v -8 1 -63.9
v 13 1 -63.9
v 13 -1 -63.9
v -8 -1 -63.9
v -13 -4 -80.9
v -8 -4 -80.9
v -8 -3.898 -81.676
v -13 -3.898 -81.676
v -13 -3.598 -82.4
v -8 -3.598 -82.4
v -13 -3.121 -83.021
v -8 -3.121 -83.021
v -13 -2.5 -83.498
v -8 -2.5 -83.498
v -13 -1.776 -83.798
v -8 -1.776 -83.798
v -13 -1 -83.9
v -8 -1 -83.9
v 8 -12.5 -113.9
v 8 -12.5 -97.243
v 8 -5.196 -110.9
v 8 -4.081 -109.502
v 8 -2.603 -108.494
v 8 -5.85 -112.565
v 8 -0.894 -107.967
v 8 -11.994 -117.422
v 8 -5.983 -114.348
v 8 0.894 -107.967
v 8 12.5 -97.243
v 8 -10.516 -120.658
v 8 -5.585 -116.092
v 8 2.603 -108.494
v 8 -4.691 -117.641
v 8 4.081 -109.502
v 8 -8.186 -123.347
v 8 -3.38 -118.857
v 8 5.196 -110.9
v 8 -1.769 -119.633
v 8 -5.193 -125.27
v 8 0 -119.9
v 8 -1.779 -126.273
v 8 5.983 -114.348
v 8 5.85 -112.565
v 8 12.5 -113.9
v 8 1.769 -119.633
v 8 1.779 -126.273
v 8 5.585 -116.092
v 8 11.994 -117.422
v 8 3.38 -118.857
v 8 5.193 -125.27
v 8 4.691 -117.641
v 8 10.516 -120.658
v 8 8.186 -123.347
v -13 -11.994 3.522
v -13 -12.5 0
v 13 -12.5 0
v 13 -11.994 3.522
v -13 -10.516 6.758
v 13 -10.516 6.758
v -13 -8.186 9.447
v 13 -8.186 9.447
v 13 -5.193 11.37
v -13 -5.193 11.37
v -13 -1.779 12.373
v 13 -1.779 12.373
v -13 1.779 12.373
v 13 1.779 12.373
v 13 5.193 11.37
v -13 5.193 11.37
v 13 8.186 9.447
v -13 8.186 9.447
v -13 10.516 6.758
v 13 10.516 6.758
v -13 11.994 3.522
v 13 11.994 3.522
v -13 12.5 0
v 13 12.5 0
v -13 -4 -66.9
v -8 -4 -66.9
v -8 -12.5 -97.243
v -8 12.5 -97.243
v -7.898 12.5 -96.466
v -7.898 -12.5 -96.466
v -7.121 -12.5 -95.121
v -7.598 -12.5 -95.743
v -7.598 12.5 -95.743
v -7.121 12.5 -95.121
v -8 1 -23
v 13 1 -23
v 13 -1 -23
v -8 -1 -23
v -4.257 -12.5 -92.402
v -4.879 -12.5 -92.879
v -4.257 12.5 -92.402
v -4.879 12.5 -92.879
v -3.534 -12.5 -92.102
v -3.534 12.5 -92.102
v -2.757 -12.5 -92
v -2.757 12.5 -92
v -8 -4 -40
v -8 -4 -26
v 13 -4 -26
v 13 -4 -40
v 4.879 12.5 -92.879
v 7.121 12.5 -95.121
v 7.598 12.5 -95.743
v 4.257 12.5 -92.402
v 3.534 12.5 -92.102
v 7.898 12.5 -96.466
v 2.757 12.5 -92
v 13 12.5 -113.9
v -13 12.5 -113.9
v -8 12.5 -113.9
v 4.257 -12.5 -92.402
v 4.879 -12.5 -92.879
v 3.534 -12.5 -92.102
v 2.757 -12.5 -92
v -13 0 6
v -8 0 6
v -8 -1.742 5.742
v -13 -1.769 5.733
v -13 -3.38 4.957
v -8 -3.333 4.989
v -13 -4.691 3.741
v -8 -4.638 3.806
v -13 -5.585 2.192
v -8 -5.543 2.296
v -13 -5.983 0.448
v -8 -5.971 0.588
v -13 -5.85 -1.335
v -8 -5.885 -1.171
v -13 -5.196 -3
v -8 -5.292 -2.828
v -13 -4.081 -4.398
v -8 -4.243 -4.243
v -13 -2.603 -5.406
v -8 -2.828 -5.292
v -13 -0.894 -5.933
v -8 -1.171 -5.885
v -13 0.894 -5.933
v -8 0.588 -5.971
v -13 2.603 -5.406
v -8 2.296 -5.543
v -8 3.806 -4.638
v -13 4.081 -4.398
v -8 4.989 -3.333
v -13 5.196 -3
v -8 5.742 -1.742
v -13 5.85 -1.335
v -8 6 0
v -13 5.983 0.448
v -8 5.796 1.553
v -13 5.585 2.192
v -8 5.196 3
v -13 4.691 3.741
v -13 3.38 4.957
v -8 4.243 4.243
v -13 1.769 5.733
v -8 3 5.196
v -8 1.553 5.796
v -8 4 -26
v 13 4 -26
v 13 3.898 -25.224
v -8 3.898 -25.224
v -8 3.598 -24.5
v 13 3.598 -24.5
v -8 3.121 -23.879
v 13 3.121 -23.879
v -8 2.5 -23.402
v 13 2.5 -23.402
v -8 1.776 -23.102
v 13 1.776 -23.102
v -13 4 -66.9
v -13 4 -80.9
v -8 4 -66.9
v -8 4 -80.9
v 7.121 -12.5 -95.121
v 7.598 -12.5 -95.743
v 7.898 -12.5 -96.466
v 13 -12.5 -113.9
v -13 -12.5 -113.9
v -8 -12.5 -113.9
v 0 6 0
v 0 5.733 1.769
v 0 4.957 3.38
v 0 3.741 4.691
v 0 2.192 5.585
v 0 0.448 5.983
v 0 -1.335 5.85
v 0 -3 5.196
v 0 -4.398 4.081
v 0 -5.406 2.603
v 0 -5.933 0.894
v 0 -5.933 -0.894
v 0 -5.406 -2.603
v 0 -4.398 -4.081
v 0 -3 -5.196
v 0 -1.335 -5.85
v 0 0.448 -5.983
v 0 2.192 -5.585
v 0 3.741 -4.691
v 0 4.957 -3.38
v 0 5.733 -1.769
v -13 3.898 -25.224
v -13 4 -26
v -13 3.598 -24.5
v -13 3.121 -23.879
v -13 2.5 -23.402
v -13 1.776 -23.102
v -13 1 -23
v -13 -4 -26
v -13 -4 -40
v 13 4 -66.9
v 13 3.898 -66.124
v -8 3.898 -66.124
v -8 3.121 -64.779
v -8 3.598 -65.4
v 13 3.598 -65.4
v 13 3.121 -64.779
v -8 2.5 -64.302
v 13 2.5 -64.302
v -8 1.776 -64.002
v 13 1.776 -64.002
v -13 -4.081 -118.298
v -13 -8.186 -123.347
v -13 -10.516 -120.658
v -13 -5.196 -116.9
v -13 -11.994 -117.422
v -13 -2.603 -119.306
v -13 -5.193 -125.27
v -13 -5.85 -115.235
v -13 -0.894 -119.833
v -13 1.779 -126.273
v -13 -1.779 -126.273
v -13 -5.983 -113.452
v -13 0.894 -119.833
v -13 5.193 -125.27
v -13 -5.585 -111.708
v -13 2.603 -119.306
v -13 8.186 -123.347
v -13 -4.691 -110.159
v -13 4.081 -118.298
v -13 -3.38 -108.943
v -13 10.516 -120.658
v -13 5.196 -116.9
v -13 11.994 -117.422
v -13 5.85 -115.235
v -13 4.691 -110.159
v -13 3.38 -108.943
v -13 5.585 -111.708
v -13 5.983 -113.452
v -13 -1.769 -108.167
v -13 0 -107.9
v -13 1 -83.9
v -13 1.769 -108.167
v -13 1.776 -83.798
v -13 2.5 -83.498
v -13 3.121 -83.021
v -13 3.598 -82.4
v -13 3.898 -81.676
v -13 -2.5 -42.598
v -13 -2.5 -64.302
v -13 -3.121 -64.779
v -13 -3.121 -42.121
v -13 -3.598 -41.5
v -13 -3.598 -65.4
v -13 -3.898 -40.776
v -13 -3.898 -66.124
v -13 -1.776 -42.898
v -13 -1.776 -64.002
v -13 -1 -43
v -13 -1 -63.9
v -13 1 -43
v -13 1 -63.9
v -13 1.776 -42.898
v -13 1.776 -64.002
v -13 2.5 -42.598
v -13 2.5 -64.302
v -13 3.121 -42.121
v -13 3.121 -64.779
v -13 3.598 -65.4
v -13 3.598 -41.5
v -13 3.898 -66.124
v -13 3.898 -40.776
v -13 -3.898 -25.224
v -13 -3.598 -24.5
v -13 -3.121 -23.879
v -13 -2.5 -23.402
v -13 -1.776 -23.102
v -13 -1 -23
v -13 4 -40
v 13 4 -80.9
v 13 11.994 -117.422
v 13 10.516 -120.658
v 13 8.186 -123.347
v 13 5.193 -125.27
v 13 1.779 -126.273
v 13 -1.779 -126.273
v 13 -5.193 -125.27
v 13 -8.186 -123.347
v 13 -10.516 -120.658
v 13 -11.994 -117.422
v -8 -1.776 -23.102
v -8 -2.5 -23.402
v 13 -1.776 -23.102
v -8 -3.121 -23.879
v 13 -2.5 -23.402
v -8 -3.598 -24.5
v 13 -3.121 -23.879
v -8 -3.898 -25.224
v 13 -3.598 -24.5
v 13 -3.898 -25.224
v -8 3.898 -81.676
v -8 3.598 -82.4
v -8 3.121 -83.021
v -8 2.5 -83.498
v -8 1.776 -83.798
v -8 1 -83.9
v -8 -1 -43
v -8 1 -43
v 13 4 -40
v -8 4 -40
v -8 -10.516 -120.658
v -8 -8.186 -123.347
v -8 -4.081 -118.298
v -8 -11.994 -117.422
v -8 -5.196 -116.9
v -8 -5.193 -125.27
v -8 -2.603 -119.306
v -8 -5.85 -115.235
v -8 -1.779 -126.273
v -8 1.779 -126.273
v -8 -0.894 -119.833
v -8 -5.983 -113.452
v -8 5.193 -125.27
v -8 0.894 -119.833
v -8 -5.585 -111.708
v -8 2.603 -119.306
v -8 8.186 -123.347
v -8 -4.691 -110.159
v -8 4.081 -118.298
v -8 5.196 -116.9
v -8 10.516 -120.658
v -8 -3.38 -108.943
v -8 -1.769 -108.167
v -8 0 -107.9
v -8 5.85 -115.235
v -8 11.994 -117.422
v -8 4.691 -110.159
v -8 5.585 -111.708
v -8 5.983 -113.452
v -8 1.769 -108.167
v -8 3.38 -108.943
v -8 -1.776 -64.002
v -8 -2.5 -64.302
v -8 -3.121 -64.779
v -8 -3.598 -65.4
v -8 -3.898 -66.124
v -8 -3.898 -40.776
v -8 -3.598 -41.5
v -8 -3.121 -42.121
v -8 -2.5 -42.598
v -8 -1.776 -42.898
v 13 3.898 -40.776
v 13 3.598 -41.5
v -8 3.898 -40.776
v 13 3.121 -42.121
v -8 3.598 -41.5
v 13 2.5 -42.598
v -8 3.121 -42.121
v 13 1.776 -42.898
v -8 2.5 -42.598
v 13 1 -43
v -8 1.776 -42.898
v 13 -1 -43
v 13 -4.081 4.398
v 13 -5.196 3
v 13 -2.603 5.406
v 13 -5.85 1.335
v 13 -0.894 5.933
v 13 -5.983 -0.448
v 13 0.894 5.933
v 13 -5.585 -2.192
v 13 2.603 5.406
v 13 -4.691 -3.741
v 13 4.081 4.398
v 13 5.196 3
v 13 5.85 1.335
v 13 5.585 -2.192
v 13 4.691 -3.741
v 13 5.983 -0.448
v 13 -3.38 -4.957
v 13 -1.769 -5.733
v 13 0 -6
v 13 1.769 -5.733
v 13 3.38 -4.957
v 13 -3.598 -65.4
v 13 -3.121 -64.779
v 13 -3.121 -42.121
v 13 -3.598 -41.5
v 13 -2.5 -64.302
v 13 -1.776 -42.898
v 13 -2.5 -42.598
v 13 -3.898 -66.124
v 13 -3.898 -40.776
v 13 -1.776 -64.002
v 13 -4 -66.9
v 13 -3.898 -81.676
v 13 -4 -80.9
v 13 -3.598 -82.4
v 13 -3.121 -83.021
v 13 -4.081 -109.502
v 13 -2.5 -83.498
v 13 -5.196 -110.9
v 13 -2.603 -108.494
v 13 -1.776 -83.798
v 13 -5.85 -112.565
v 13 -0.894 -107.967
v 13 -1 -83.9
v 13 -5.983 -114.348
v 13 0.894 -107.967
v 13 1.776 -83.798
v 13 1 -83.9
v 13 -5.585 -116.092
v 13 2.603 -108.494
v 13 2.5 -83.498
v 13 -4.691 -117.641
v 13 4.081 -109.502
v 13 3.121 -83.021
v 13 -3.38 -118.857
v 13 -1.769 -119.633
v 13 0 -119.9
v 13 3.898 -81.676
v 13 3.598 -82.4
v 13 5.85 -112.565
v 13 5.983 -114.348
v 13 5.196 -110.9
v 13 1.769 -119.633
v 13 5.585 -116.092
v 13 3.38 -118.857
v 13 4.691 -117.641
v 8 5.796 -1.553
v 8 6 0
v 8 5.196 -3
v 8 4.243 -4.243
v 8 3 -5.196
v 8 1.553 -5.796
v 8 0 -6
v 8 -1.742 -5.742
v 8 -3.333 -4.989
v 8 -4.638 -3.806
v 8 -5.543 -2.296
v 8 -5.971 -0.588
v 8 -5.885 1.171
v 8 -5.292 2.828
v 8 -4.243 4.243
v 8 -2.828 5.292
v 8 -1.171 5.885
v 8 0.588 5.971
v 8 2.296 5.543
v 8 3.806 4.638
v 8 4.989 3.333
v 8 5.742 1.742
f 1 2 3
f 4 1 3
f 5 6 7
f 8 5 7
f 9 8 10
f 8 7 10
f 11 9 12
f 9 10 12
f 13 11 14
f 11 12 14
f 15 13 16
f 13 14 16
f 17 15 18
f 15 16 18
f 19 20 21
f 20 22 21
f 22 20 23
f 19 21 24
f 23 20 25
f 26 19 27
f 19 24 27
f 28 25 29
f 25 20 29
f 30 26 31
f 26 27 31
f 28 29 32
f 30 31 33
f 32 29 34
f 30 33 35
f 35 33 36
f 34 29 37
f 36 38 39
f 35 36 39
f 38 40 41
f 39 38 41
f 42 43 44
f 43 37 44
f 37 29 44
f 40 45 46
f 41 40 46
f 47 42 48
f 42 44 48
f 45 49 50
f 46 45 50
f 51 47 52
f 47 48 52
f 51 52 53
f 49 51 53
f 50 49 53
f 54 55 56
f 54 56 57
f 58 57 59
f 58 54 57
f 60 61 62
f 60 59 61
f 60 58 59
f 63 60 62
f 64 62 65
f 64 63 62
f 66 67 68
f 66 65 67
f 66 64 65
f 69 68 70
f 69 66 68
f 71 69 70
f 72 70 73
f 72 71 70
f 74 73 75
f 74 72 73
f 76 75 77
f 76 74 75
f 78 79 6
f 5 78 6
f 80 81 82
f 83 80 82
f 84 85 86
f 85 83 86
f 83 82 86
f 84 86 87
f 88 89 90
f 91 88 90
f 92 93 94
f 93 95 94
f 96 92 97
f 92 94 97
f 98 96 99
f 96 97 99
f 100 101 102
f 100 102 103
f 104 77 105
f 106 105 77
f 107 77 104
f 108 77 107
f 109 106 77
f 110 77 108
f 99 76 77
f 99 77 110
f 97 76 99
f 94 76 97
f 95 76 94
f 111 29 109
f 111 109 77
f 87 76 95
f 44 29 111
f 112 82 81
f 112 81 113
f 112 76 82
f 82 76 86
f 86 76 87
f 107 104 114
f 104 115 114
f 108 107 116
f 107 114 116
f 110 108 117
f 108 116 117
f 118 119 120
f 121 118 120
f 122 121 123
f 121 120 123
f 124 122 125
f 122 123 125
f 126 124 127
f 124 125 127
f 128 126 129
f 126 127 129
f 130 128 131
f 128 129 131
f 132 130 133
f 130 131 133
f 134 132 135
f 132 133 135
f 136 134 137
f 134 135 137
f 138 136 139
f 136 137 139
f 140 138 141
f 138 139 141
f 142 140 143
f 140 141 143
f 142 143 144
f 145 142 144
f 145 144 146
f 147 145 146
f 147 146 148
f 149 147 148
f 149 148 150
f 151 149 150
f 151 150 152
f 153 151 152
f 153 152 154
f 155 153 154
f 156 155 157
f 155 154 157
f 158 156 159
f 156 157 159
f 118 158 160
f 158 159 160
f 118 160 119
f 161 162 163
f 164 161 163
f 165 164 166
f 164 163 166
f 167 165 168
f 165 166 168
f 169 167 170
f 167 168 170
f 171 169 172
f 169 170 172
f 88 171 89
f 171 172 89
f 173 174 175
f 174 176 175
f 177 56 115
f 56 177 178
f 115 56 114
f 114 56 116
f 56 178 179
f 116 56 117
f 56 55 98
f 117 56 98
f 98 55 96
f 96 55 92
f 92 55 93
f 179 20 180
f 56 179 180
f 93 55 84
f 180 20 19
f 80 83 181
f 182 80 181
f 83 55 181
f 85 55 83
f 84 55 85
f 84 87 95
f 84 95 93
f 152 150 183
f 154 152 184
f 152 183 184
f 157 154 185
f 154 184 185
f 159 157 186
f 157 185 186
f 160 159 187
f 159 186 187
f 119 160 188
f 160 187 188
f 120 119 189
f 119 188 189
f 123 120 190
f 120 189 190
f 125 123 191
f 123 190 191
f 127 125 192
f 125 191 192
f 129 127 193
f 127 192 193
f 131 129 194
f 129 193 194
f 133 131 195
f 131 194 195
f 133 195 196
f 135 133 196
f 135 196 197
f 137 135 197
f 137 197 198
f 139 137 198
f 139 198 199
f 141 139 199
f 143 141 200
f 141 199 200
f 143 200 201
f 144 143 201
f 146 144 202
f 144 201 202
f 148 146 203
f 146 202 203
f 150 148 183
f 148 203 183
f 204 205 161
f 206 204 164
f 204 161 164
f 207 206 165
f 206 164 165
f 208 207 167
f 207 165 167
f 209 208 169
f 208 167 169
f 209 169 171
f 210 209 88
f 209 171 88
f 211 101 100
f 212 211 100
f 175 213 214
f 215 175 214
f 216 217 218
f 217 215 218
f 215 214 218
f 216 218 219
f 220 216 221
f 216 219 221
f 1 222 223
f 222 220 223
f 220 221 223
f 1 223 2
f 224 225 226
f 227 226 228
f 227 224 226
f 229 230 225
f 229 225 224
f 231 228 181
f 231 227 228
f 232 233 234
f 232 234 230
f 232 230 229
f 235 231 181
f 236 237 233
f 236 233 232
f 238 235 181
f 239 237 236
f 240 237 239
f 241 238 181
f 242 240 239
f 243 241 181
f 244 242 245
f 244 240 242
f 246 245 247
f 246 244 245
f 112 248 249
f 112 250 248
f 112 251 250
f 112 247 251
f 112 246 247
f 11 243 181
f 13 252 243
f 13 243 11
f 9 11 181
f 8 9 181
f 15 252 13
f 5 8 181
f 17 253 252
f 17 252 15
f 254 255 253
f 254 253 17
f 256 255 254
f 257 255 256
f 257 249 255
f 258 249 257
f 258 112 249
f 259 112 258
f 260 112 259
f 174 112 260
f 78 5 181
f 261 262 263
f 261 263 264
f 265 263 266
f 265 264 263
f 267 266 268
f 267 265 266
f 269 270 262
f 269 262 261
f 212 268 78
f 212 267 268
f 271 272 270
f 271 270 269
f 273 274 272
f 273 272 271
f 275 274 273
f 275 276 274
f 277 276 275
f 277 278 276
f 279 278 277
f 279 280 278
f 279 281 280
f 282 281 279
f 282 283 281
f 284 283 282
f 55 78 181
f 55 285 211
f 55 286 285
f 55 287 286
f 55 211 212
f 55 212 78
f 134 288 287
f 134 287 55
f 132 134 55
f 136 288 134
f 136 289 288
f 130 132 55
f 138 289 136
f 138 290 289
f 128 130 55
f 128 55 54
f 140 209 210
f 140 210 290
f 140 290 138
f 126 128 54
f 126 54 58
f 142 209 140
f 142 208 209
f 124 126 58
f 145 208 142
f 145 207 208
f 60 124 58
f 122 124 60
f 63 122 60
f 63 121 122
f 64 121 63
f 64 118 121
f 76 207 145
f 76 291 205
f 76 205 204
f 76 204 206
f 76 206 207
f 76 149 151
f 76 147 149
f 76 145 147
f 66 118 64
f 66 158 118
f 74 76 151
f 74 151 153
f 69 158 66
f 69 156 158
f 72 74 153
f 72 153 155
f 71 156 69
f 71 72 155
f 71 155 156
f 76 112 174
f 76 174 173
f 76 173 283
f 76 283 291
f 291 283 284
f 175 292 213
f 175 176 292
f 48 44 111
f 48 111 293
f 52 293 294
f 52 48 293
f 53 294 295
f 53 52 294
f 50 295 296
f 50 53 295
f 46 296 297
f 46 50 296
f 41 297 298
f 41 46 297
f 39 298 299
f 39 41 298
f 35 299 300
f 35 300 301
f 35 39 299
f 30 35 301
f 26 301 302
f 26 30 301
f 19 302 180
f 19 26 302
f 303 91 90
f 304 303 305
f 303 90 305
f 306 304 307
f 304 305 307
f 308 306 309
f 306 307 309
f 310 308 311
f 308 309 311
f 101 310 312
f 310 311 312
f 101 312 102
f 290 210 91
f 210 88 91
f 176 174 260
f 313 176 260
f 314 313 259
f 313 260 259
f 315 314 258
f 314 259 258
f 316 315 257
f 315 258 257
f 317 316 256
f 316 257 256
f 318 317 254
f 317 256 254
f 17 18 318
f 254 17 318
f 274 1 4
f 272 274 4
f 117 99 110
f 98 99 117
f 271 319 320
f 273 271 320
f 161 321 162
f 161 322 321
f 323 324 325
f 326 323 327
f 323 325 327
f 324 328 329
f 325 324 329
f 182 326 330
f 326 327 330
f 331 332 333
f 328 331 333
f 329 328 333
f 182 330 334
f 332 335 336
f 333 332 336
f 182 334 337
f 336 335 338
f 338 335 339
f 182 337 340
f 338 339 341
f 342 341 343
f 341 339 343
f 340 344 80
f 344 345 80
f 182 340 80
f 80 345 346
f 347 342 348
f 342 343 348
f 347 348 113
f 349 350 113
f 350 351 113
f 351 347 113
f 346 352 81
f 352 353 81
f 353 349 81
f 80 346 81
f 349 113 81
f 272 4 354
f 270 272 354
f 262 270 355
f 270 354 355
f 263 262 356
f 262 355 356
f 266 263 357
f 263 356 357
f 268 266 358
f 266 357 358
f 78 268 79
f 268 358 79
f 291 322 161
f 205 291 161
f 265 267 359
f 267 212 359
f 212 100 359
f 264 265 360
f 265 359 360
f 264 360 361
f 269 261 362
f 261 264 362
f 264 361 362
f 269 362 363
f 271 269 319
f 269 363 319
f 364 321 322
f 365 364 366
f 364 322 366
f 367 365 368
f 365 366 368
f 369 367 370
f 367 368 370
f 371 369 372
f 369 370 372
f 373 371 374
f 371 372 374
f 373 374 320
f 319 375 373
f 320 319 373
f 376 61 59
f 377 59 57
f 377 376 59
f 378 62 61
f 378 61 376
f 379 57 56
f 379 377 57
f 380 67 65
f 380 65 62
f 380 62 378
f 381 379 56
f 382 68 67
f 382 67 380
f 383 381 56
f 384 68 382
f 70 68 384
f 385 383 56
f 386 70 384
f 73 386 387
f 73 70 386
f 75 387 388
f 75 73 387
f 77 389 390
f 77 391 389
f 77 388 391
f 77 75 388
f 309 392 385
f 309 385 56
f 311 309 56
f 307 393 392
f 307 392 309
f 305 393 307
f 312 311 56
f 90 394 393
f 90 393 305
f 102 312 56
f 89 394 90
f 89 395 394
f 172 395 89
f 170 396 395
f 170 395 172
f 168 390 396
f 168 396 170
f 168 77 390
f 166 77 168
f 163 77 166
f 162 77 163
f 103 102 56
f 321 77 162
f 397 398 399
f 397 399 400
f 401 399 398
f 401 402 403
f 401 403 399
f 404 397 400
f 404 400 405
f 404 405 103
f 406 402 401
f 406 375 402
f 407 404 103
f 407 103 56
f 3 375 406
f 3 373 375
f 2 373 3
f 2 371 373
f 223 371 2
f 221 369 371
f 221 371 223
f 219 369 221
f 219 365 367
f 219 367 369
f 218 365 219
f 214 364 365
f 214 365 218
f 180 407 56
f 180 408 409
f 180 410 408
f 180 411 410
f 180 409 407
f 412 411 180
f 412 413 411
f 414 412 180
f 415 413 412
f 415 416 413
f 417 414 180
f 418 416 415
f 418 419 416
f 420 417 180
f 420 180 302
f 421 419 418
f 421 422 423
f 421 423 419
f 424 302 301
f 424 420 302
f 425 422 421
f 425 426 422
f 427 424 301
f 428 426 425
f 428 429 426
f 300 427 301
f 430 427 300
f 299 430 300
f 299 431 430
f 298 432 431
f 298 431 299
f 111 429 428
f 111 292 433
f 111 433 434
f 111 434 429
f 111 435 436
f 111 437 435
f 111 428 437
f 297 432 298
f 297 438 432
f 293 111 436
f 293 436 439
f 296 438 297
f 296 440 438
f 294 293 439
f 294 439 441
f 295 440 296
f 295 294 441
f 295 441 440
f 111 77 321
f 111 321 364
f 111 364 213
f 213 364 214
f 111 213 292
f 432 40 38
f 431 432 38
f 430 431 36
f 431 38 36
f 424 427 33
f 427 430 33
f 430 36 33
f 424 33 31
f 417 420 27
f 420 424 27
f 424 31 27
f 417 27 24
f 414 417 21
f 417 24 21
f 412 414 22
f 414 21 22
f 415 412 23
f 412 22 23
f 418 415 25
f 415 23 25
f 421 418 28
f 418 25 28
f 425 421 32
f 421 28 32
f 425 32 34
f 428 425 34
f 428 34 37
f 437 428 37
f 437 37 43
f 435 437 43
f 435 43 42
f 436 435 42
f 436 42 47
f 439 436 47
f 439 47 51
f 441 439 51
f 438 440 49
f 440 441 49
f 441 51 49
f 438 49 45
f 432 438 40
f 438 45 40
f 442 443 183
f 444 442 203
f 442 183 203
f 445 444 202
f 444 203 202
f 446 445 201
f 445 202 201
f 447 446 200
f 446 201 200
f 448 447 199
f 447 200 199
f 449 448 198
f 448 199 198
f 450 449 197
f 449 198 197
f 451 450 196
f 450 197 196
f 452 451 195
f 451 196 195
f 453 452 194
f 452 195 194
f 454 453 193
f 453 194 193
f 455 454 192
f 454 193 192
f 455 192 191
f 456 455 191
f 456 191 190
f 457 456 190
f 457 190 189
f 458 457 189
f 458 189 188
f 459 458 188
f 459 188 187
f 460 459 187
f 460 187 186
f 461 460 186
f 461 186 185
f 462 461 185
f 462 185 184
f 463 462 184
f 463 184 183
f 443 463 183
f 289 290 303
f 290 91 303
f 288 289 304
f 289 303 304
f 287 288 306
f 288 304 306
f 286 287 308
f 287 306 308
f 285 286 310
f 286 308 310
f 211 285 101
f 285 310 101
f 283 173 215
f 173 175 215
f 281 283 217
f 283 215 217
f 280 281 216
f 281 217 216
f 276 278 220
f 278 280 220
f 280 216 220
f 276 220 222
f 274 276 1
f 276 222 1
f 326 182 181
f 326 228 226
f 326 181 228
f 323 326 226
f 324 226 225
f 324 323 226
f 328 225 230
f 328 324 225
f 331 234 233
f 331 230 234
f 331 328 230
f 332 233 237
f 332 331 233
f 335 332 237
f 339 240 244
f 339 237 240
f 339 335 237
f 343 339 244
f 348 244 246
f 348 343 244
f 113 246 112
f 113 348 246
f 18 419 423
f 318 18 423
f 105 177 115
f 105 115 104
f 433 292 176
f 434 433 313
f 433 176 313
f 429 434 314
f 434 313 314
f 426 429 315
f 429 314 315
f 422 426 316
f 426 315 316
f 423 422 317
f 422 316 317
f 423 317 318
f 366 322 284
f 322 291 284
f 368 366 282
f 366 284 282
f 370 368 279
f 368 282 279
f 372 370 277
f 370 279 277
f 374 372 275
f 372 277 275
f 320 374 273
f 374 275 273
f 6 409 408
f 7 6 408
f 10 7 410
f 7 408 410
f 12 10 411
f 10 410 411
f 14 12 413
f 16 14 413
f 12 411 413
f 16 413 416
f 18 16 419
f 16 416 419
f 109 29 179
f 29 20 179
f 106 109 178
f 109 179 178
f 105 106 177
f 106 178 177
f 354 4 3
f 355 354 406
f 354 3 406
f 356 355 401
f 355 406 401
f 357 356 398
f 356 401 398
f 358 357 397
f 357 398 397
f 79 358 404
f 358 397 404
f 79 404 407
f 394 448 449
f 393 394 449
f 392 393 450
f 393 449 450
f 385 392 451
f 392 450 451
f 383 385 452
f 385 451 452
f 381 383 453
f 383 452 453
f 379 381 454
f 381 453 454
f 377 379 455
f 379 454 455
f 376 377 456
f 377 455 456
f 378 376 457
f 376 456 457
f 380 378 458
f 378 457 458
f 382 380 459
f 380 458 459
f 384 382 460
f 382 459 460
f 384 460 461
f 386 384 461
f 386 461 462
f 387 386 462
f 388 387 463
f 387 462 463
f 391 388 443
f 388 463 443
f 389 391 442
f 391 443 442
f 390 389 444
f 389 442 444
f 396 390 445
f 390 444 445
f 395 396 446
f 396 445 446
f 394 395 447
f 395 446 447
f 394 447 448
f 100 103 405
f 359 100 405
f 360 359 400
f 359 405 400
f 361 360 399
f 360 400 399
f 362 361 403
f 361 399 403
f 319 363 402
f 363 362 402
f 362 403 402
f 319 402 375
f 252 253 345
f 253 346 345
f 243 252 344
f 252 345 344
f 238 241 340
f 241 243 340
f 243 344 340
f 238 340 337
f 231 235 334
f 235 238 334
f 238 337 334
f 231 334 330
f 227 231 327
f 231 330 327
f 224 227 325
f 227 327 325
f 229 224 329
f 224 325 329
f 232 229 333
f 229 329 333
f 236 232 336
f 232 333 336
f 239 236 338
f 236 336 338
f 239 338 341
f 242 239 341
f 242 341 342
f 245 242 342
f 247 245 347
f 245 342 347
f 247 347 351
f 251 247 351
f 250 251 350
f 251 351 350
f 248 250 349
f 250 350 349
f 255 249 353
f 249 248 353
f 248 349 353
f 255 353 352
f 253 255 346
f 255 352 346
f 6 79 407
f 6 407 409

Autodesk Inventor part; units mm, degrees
ref_plane "YZ Plane" through (0, 0, 0) normal (1, 0, 0) x (0, 1, 0)
ref_plane "XZ Plane" through (0, 0, 0) normal (0, 1, 0) x (-1, 0, 0)
ref_plane "XY Plane" through (0, 0, 0) normal (0, 0, 1) x (1, 0, 0)
sketch "草圖1" plane through (0, 0, 0) normal (1, 0, 0) x (0, 1, 0)
  line L0 (0, 0) -> (0, -113.9)
  circle A0 centre (0, 0) radius 6
  circle A1 centre (0, -113.9) radius 6
  circle A2 centre (0, 0) radius 12.5
  circle A3 centre (0, -113.9) radius 12.5
  line L1 (12.5, 0) -> (12.5, -113.9)
  line L2 (-12.5, 0) -> (-12.5, -113.9)
  line L3 (4, -23) -> (-4, -23)
  line L4 (-4, -23) -> (-4, -43)
  line L5 (-4, -43) -> (4, -43)
  line L6 (4, -43) -> (4, -23)
  line L7 (4, -63.9) -> (-4, -63.9)
  line L8 (-4, -63.9) -> (-4, -83.9)
  line L9 (-4, -83.9) -> (4, -83.9)
  line L10 (4, -83.9) -> (4, -63.9)
  line L11 (12.5, -92) -> (-12.5, -92)
  point P0 (0, -23)
  point P1 (0, -63.9)
  dimension "d0" = 113.9
  dimension "d1" = 12
  dimension "d2" = 25
  dimension "d5" = 20
  dimension "d7" = 8
  dimension "d8" = 23
  dimension "d9" = 30
  dimension "d11" = 92
extrude "擠出1" add sketch "草圖1" along normal mid plane 16 contours A2 L1 L11 L0 L9 L10 L7 L5 L6 L3 | L0 L3 L4 L5 L7 L8 L9 L11 L2 A2 | A2
sketch "草圖4" plane through (8, 0, 0) normal (1, 0, 0) x (0, 0, -1)
  line L0 (63.9, -4) -> (63.9, 4) projected
  line L1 (63.9, 4) -> (83.9, 4) projected
  line L2 (83.9, 4) -> (83.9, -4) projected
  line L3 (83.9, -4) -> (63.9, -4) projected
  line L4 (43, 4) -> (43, -4) projected
  line L5 (43, -4) -> (23, -4) projected
  line L6 (23, -4) -> (23, 4) projected
  line L7 (23, 4) -> (43, 4) projected
  circle A0 centre (0, 0) radius 6 projected
  line L8 (92, 12.5) -> (0, 12.5) projected
  arc A1 (0, 12.5) -> (0, -12.5) centre (0, 0) ccw projected
  line L9 (0, -12.5) -> (92, -12.5) projected
  line L10 (0, 12.5) -> (113.9, 12.5) projected
  line L11 (0, -12.5) -> (113.9, -12.5) projected
  circle A2 centre (113.9, 0) radius 12.5 projected
  circle A3 centre (113.9, 0) radius 6 projected
  point P0 (96, -12.5)
  point P1 (96, 12.5)
extrude "擠出4" add sketch "草圖4" along normal blind 5
sketch "草圖5" plane through (-8, 0, 0) normal (-1, 0, 0) x (0, 0, 1)
  line L0 (-92, -12.5) -> (0, -12.5) projected
  arc A0 (0, -12.5) -> (0, 12.5) centre (0, 0) ccw projected
  line L1 (0, 12.5) -> (-92, 12.5) projected
  circle A1 centre (0, 0) radius 6 projected
  line L2 (-43, -4) -> (-43, 4) projected
  line L3 (-43, 4) -> (-23, 4) projected
  line L4 (-23, 4) -> (-23, -4) projected
  line L5 (-23, -4) -> (-43, -4) projected
  line L6 (-63.9, 4) -> (-63.9, -4) projected
  line L7 (-63.9, -4) -> (-83.9, -4) projected
  line L8 (-83.9, -4) -> (-83.9, 4) projected
  line L9 (-83.9, 4) -> (-63.9, 4) projected
  line L10 (0, -12.5) -> (-113.9, -12.5) projected
  line L11 (0, 12.5) -> (-113.9, 12.5) projected
  circle A2 centre (-113.9, 0) radius 12.5 projected
  circle A3 centre (-113.9, 0) radius 6 projected
extrude "擠出5" add sketch "草圖5" along normal blind 5
chamfer "倒角2" distance 4 angle 45 2 edges at (-8, 0, -92) (8, 0, -92)
fillet "圓角4" radius 3 4 edges at (-8, 0, -96) (-4, 0, -92) (4, 0, -92) (8, 0, -96)
fillet "圓角5" radius 3 8 edges at (0, 4, -23) (0, -4, -23) (0, -4, -43) (0, 4, -43) (0, 4, -63.9) (0, -4, -63.9) (0, -4, -83.9) (0, 4, -83.9)
properties part number "Link_OC" material "ABS 塑膠"
